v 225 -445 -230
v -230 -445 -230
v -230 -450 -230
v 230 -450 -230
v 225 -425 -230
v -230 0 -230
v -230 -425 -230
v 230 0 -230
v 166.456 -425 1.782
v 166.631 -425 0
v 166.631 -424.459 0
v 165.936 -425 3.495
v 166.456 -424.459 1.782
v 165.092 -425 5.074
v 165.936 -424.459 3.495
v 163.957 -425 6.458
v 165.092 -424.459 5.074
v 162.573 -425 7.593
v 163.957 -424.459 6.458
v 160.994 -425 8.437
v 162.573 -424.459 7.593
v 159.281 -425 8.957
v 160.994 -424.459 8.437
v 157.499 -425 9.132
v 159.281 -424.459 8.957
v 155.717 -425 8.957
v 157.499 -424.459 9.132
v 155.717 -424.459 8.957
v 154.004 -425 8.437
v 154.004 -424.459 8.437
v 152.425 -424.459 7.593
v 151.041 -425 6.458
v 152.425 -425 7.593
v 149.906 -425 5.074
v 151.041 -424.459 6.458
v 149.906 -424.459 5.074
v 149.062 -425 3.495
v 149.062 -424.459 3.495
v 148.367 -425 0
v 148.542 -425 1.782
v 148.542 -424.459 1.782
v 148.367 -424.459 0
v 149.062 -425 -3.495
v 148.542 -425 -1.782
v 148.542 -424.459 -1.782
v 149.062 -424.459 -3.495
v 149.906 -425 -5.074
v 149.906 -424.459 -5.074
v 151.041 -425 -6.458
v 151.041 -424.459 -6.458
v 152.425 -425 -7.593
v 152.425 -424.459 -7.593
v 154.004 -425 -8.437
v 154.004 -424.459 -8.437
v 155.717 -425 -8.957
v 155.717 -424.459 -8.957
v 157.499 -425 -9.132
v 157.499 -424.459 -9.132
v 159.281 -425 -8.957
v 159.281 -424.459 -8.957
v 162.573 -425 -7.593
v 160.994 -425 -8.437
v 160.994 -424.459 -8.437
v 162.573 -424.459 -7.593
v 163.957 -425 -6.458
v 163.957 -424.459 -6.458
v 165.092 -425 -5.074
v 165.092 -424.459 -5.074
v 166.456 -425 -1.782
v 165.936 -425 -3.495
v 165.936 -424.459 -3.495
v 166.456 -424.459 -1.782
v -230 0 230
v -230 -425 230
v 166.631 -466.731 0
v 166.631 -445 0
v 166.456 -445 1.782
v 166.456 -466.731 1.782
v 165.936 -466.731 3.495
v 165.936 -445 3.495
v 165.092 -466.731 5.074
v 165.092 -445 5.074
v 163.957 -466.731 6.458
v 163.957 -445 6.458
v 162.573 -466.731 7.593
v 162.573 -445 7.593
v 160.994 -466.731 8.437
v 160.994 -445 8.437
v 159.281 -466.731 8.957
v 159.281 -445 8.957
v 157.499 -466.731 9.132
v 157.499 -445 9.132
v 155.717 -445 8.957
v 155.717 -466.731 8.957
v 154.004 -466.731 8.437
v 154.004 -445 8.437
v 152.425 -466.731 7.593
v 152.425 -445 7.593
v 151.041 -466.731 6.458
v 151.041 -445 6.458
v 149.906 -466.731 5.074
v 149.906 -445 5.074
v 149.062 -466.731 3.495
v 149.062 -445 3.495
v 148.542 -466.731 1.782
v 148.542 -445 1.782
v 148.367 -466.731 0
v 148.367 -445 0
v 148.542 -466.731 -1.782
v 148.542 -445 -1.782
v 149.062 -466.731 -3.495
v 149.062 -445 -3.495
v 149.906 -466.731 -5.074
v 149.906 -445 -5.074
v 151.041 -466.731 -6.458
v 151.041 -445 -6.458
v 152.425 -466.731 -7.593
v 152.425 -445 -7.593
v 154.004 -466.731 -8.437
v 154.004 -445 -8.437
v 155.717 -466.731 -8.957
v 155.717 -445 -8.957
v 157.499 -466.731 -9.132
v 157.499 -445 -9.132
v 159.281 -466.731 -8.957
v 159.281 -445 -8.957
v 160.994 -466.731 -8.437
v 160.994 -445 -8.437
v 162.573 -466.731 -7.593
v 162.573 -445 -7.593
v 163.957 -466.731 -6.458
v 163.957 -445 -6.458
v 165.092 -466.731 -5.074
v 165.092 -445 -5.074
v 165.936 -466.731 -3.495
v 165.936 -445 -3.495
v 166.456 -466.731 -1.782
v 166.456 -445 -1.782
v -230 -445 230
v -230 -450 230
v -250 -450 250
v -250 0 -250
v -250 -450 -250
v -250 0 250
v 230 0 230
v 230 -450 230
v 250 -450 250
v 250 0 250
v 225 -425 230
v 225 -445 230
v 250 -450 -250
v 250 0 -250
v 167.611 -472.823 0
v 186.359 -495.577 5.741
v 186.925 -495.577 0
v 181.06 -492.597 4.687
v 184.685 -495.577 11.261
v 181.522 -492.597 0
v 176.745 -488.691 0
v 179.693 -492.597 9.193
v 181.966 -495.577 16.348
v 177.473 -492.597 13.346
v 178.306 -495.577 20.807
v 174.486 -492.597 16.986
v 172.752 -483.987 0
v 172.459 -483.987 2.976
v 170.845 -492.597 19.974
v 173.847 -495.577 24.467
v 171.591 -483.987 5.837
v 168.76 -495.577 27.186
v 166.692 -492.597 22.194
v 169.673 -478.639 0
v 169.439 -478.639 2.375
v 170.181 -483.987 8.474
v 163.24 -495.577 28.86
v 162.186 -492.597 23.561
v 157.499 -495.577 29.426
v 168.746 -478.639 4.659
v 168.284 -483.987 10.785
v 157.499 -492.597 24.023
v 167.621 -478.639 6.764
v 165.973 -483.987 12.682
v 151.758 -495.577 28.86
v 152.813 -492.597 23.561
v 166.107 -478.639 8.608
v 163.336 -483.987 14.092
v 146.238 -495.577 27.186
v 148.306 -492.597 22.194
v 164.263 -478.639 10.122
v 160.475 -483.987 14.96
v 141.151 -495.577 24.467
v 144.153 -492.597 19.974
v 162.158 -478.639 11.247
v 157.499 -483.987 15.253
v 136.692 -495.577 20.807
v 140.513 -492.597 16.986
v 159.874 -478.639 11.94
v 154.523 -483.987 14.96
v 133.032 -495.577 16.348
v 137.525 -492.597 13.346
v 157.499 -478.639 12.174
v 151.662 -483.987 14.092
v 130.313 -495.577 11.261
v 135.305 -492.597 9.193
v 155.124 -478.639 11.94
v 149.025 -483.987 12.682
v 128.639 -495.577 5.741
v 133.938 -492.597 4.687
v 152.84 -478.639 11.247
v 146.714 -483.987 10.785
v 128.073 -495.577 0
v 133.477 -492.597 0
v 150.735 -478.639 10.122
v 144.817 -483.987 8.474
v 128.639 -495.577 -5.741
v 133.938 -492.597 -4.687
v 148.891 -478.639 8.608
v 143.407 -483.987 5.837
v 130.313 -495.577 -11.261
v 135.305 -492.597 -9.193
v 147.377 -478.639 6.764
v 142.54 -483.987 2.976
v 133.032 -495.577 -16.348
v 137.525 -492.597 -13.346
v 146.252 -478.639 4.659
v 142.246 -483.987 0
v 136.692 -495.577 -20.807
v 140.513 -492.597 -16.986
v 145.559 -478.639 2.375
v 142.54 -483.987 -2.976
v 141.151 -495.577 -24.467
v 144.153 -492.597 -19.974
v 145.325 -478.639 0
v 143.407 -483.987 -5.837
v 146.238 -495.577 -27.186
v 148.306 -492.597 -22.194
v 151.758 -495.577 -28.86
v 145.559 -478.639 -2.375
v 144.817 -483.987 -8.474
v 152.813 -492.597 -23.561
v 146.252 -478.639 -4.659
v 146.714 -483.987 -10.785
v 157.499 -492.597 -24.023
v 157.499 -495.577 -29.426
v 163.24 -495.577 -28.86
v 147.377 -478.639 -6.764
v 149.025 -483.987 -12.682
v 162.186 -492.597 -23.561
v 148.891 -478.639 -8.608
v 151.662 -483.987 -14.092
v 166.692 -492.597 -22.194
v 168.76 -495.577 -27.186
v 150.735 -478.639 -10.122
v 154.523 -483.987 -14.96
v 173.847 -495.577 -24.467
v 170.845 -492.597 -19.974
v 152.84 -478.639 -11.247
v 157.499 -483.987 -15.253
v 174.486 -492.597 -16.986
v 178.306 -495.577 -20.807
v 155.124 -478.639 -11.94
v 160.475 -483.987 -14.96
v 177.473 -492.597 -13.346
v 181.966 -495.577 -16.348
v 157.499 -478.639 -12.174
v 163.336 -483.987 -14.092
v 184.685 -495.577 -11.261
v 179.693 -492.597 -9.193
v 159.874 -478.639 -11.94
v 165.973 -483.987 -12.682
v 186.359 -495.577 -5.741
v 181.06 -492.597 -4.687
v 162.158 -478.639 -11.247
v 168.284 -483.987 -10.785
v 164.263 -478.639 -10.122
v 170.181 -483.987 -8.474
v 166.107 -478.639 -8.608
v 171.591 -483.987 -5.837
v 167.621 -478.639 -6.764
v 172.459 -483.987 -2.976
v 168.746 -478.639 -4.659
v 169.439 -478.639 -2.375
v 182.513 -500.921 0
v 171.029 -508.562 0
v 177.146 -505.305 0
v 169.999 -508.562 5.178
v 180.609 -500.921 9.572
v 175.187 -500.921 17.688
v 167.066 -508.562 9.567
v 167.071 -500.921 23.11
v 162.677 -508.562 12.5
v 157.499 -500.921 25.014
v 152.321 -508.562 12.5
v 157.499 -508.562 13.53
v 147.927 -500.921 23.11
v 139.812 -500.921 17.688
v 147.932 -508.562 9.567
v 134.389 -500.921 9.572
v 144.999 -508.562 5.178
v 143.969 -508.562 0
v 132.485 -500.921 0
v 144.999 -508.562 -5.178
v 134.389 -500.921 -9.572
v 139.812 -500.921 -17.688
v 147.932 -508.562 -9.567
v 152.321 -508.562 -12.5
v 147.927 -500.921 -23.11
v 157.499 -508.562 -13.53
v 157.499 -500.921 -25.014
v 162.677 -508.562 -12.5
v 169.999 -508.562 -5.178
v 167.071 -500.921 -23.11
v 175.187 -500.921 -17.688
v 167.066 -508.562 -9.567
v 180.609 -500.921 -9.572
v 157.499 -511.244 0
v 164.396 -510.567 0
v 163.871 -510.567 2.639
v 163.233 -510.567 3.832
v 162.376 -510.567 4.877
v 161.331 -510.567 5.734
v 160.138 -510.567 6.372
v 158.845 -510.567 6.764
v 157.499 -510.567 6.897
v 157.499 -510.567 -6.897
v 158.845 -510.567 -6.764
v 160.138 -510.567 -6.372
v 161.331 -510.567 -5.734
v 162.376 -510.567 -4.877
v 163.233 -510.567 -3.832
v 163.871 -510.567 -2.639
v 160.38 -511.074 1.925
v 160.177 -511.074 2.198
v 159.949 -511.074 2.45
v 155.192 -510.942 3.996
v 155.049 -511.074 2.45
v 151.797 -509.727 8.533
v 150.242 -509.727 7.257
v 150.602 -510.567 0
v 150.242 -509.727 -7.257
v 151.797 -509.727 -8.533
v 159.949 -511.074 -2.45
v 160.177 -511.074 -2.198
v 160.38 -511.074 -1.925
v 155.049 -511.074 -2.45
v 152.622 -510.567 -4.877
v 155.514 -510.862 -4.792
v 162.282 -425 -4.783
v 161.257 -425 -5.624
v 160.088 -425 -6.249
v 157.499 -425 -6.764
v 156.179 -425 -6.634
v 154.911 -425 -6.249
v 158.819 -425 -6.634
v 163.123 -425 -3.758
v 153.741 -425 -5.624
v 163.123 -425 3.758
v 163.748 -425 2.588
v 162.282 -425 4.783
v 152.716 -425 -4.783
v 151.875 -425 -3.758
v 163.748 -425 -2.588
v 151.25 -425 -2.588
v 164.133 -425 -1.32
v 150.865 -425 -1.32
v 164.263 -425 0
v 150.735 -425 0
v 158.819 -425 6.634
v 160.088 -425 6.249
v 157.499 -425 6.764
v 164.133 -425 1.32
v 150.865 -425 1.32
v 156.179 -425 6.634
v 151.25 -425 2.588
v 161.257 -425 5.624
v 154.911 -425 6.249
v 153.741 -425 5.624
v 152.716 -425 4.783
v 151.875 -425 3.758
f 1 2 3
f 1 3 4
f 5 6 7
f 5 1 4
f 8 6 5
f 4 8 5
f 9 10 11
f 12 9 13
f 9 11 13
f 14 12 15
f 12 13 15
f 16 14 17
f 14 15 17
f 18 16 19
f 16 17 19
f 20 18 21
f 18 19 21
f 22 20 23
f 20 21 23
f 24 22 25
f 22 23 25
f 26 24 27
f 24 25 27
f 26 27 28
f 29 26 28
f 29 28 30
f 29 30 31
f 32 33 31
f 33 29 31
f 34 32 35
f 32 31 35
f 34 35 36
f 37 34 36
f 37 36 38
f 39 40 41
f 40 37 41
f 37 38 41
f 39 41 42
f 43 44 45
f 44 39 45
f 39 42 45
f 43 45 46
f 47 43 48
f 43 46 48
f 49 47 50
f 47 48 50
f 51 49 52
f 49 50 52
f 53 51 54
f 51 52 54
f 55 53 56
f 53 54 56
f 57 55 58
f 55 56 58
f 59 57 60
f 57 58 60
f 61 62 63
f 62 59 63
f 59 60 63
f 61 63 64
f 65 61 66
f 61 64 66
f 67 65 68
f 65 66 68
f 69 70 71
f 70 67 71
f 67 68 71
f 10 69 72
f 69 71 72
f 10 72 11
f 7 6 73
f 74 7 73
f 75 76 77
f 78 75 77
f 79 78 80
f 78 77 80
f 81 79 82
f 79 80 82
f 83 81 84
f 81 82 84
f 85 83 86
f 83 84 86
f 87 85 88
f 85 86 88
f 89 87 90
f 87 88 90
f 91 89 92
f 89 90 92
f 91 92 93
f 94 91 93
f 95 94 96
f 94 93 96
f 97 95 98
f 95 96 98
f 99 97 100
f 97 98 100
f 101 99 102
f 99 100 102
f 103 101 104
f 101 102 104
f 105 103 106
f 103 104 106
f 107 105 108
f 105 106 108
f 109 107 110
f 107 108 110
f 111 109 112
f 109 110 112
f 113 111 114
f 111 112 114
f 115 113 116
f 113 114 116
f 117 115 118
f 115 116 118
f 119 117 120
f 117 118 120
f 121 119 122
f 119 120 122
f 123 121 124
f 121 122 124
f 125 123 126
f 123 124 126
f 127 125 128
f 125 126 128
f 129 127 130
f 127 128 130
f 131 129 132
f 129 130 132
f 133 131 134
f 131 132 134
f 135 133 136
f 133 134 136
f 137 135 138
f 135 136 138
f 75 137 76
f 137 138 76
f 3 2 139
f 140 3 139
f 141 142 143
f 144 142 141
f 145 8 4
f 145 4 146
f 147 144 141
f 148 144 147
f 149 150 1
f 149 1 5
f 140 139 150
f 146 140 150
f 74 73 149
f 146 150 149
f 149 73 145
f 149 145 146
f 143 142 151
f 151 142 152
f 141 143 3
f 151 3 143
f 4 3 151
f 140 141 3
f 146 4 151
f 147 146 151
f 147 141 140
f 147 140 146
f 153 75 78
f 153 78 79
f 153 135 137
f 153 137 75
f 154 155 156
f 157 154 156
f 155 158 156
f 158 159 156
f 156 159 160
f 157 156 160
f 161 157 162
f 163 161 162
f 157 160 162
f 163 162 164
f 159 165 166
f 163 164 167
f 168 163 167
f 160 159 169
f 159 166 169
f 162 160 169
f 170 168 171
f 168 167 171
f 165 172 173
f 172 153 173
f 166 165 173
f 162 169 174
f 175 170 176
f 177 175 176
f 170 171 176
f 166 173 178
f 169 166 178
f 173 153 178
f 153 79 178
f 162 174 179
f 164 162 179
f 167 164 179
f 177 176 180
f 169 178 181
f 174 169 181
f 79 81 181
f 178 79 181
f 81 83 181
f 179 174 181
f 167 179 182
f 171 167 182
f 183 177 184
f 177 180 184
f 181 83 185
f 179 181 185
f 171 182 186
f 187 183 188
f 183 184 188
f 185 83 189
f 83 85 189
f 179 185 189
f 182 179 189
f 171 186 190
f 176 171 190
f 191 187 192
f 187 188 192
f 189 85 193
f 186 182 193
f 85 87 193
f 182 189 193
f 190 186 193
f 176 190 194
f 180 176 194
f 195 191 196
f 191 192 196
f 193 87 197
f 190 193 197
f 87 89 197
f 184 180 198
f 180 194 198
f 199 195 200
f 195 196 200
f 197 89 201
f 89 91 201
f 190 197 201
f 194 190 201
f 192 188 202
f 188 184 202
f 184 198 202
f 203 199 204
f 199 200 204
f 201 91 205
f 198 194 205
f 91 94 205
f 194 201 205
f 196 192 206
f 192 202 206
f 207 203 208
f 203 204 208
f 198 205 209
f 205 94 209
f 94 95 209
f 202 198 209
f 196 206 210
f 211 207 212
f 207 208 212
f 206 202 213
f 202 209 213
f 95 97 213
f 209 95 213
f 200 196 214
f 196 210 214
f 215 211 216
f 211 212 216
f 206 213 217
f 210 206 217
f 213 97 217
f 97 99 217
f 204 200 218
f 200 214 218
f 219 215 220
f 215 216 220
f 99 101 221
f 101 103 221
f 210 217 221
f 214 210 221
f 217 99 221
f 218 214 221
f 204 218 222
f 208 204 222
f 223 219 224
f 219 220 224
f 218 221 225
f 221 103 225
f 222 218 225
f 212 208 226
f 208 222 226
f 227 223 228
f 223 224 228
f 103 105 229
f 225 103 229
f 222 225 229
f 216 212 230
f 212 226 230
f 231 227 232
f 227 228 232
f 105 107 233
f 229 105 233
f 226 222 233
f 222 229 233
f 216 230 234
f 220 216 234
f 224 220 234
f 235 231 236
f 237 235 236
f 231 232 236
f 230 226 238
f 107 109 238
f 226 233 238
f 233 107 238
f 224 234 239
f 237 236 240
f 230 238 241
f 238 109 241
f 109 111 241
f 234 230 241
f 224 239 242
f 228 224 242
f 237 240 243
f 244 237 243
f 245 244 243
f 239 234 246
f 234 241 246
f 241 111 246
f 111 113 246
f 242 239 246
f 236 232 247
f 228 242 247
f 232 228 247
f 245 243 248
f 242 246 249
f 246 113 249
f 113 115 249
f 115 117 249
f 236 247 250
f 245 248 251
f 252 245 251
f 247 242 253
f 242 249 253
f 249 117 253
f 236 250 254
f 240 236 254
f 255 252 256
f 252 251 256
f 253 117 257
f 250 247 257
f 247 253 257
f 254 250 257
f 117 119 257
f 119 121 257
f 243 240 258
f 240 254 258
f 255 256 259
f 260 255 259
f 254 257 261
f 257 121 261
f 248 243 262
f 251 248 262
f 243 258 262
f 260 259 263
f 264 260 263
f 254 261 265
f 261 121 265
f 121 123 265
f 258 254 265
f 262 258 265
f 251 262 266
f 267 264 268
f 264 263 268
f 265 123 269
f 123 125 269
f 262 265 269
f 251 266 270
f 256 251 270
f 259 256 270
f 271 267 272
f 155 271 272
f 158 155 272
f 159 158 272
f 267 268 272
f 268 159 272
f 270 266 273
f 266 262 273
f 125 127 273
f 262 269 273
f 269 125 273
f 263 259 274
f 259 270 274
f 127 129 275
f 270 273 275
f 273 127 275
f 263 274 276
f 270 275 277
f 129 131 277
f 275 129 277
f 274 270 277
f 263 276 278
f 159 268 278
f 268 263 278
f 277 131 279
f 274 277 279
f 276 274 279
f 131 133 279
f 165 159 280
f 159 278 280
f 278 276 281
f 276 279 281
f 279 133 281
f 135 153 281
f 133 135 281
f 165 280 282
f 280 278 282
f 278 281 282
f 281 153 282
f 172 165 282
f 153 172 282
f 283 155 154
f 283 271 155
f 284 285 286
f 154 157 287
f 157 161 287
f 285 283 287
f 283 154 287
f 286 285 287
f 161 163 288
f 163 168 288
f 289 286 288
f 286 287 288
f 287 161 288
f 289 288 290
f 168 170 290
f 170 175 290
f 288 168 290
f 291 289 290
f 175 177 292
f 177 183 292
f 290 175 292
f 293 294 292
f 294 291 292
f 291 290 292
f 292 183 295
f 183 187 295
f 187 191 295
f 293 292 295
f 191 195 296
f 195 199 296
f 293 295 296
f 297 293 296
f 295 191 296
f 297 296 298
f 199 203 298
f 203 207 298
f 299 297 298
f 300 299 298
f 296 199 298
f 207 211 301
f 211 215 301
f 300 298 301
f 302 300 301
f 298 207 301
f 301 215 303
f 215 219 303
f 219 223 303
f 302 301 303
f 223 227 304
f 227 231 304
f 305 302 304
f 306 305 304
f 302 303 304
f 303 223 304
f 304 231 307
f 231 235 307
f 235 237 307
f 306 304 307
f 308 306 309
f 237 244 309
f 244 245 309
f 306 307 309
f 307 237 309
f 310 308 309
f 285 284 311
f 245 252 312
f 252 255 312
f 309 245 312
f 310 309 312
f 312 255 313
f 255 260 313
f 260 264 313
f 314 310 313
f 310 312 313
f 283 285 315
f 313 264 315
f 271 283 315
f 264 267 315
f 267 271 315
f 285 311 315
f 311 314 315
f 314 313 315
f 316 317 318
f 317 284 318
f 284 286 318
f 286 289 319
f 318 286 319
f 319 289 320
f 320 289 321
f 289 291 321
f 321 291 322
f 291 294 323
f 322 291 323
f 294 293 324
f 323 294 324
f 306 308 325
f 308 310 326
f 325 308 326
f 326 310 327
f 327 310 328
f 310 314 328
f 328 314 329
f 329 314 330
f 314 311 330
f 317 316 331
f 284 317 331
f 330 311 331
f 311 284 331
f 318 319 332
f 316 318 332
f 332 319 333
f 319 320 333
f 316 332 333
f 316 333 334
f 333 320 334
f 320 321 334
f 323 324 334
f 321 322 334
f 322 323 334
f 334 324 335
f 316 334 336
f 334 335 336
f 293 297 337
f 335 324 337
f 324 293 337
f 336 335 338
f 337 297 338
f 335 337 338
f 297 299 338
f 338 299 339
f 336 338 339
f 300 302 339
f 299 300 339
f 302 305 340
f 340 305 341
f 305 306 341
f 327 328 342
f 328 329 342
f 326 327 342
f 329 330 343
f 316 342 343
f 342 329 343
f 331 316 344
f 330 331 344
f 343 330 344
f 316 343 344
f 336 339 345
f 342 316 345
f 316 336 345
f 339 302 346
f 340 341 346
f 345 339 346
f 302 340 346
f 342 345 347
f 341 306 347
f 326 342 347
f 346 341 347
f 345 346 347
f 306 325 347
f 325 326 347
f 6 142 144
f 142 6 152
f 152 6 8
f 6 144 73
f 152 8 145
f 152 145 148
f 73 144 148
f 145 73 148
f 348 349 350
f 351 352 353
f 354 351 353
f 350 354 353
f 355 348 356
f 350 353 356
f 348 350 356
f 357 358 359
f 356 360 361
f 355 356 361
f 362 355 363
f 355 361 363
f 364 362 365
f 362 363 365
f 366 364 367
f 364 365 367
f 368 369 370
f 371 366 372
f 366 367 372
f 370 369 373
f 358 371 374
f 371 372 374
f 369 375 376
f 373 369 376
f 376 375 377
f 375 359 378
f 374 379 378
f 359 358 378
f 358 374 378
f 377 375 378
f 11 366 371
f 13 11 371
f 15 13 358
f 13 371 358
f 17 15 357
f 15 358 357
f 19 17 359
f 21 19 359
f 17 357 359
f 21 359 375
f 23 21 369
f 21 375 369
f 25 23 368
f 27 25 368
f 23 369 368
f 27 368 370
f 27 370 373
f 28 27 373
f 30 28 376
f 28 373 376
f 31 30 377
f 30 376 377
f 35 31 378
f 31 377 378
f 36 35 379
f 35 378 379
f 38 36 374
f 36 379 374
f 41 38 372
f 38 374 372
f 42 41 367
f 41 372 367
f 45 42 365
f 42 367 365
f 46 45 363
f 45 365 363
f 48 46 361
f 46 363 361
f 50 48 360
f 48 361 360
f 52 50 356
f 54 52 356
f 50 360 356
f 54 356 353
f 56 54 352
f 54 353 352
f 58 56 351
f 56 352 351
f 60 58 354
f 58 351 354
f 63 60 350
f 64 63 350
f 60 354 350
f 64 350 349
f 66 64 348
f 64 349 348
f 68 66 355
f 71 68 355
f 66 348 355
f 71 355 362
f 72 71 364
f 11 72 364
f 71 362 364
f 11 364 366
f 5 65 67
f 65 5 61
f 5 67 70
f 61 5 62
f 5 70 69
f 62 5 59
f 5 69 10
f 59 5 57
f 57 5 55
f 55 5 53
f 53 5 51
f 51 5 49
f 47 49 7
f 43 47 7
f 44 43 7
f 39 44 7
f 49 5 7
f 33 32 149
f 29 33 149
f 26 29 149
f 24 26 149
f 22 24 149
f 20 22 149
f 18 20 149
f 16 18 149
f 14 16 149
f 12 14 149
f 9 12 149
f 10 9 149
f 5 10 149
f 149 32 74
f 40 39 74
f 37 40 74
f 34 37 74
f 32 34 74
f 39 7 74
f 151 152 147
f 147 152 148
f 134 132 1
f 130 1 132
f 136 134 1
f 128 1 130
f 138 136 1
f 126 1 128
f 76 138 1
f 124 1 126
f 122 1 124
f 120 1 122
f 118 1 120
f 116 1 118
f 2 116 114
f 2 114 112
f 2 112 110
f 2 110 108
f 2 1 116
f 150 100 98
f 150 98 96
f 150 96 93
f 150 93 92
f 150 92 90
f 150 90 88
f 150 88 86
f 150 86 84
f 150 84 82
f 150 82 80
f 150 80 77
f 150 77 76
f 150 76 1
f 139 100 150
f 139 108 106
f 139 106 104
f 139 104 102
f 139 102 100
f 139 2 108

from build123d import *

# Parameters (mm, degrees)
F0_W     = 500
F0_H     = 500
F0_W_2   = 460
F0_H_2   = 460
F1_DEPTH = 450
F2_W     = 20
F2_H     = 460
F3_DEPTH = 455


with BuildPart() as f1:
    # F0 (on Front) → F1 (new body)
    with BuildSketch(Plane.XZ):
        Rectangle(F0_W, F0_H)
        Rectangle(F0_W_2, F0_H_2, mode=Mode.SUBTRACT)
    extrude(amount=F1_DEPTH)

    # F2 (on face) → F3 (join)
    with BuildSketch(Plane.YZ.offset(-230)):
        with Locations((-435, 0)):
            Rectangle(F2_W, F2_H)
    extrude(amount=F3_DEPTH)

    # F4 (on Top) → F5 (revolve)
    with BuildSketch(Plane.XY):
        with BuildLine():
            Line((166.631432, -424.459219), (157.49906, -426.544428))
            Line((157.49906, -426.544428), (157.49906, -511.243738))
            ThreePointArc((157.49906, -511.243738), (174.167415, -507.082896), (186.924866, -495.576632))
            ThreePointArc((186.924866, -495.576632), (172.751683, -483.986573), (166.631432, -466.731107))
            Line((166.631432, -466.731107), (166.631432, -424.459219))
        make_face()
    revolve(axis=Axis((157.49906, -468.894083, 0), (0, -1, 0)))


solid = f1.part
